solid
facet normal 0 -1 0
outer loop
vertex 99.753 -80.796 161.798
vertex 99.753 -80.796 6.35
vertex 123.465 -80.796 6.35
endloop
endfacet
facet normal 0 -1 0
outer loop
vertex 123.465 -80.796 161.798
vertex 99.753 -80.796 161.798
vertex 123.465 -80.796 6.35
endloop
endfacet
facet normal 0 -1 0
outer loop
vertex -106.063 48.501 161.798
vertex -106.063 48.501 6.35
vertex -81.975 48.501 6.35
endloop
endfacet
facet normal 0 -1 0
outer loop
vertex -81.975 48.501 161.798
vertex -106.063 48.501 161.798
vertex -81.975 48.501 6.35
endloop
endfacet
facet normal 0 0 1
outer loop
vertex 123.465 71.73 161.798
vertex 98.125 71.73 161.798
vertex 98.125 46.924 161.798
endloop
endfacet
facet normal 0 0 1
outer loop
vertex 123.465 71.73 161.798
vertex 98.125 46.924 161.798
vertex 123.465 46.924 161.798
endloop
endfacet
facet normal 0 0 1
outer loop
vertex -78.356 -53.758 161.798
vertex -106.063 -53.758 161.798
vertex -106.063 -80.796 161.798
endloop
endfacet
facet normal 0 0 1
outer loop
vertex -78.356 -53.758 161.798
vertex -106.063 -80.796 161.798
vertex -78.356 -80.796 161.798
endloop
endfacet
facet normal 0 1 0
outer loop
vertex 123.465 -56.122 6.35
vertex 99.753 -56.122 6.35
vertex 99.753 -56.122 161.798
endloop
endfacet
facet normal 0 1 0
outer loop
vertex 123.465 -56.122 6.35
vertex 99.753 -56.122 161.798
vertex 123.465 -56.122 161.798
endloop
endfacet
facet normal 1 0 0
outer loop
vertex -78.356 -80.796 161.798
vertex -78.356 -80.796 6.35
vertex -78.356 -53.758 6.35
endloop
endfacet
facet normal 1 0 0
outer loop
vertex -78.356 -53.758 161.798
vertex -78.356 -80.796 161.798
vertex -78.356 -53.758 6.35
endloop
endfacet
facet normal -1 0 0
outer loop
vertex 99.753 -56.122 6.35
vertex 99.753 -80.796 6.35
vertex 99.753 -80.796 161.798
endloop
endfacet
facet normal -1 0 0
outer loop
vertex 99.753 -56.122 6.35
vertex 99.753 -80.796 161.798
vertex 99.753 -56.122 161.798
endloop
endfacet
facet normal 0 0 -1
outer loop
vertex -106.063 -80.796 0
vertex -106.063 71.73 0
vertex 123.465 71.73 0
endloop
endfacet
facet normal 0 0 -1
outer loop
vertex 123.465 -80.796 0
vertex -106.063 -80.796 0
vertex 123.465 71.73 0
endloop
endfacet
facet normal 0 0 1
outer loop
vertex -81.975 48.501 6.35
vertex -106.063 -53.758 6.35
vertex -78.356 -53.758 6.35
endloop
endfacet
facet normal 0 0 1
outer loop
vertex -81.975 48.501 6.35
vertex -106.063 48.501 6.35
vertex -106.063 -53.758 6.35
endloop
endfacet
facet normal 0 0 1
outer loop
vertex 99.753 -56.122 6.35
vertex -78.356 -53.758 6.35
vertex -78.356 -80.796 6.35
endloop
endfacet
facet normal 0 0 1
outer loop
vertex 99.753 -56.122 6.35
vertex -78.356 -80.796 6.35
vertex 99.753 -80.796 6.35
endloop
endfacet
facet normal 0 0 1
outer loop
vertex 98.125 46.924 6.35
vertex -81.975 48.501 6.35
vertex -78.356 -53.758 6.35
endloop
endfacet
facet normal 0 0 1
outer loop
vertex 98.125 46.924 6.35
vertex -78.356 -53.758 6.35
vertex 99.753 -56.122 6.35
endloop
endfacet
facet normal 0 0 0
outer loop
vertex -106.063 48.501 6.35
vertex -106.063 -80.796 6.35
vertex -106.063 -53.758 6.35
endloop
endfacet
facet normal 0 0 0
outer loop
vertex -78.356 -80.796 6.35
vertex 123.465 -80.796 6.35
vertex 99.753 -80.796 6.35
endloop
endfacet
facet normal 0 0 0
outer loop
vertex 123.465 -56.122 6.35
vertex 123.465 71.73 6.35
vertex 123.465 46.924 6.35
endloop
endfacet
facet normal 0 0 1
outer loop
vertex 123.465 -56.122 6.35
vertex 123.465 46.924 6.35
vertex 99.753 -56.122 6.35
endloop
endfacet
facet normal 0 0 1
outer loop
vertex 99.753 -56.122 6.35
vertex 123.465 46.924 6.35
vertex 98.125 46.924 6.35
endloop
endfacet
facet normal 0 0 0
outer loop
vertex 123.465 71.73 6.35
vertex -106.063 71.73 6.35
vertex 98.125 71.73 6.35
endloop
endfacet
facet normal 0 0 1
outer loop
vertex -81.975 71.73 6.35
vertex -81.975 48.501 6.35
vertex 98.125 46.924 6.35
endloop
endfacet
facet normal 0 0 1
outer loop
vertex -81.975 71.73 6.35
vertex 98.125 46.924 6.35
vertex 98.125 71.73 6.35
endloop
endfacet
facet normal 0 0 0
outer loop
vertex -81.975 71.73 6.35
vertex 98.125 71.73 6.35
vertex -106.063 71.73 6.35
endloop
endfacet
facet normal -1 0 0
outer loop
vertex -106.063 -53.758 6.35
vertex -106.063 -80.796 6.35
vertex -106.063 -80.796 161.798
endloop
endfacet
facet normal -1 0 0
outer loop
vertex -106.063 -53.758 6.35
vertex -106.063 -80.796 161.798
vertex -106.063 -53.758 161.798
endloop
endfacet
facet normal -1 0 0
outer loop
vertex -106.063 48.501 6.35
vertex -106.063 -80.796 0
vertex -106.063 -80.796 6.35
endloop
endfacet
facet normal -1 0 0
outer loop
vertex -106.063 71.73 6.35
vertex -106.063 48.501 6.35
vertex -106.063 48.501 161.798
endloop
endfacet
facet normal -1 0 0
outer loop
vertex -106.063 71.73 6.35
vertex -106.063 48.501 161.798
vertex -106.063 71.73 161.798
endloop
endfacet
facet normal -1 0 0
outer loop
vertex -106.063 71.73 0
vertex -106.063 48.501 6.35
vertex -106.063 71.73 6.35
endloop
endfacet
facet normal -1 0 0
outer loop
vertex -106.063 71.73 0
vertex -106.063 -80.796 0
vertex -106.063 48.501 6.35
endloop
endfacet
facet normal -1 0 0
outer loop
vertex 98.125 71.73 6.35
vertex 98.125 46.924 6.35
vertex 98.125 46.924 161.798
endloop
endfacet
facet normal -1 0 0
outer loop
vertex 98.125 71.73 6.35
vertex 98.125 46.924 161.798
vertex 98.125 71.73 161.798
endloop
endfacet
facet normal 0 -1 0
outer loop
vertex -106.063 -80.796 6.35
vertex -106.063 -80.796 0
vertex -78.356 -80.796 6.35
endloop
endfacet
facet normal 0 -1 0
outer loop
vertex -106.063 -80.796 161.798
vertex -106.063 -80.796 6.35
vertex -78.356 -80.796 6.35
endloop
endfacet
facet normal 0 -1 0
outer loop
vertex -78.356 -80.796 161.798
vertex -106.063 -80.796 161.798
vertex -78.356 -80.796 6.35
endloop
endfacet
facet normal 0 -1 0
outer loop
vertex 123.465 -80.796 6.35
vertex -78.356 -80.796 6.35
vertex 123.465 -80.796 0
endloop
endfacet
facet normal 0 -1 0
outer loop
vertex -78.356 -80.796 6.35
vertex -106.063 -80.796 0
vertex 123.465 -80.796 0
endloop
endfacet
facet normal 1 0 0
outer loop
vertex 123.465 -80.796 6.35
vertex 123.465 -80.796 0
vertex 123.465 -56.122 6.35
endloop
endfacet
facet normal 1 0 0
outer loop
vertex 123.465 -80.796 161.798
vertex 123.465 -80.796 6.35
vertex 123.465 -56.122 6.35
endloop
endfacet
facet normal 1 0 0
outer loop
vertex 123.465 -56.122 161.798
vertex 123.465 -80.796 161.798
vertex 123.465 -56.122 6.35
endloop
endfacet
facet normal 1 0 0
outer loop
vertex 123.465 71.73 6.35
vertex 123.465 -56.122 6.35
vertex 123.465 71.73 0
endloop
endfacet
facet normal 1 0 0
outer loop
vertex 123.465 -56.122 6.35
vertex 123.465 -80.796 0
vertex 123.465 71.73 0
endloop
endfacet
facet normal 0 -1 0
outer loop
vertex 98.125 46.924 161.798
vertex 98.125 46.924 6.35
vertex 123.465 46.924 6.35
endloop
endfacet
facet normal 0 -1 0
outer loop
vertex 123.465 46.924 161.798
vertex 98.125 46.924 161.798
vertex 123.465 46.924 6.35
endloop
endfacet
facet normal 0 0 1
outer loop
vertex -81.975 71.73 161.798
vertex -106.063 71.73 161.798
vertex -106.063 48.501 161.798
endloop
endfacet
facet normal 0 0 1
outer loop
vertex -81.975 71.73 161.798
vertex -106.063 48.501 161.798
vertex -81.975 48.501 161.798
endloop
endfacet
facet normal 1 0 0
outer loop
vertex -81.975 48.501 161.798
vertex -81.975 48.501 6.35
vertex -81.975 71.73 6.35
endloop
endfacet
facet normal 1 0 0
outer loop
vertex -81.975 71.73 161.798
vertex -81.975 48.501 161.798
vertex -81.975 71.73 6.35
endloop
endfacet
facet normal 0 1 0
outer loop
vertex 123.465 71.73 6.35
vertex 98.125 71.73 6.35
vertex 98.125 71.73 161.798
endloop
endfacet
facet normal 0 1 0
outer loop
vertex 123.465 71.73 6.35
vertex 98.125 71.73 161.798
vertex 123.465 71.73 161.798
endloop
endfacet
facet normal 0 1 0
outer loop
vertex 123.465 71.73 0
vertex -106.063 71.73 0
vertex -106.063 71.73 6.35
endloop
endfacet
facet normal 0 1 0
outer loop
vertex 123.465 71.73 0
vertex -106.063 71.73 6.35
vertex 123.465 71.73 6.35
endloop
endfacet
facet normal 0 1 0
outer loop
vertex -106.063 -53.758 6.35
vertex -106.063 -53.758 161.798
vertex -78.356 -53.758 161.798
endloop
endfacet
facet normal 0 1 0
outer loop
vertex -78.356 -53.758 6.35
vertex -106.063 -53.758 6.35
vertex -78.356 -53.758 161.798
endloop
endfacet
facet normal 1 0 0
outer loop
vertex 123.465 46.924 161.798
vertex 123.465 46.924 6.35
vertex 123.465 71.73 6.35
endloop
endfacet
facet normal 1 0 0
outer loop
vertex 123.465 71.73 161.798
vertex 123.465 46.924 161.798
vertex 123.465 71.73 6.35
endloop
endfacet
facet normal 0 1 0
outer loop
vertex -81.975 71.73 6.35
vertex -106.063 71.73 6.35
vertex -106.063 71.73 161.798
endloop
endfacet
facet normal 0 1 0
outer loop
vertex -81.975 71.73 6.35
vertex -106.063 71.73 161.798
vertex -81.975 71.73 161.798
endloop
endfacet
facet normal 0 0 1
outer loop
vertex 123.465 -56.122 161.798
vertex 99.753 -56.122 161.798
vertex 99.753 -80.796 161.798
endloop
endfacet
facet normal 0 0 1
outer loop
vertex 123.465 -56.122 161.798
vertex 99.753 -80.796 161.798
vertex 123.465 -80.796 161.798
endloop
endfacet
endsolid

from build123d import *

# Parameters (mm, degrees)
F0_W     = 229.52804
F0_H     = 152.525924
F1_DEPTH = 6.35
F2_W     = 23.711868
F2_H     = 24.674061
F3_DEPTH = 155.448
F4_W     = 25.340267
F4_H     = 24.805527
F5_DEPTH = 155.448
F6_W     = 27.706921
F6_H     = 27.038488
F6_W_2   = 24.087668
F6_H_2   = 23.228791
F7_DEPTH = 155.448


with BuildPart() as f1:
    # F0 (on Top) → F1 (new body)
    with BuildSketch(Plane.XY):
        with Locations((8.701302, -4.533436)):
            Rectangle(F0_W, F0_H)
    extrude(amount=F1_DEPTH)

    # F2 (on face) → F3 (join)
    with BuildSketch(Plane.XY.offset(6.35)):
        with Locations((111.609388, -68.459367)):
            Rectangle(F2_W, F2_H)
    extrude(amount=F3_DEPTH)

    # F4 (on face) → F5 (join)
    with BuildSketch(Plane.XY.offset(6.35)):
        with Locations((110.795188, 59.326762)):
            Rectangle(F4_W, F4_H)
    extrude(amount=F5_DEPTH)

    # F6 (on face) → F7 (join)
    with BuildSketch(Plane.XY.offset(6.35)):
        with Locations((-92.209257, -67.277154)):
            Rectangle(F6_W, F6_H)
        with Locations((-94.018884, 60.11513)):
            Rectangle(F6_W_2, F6_H_2)
    extrude(amount=F7_DEPTH)


solid = f1.part
